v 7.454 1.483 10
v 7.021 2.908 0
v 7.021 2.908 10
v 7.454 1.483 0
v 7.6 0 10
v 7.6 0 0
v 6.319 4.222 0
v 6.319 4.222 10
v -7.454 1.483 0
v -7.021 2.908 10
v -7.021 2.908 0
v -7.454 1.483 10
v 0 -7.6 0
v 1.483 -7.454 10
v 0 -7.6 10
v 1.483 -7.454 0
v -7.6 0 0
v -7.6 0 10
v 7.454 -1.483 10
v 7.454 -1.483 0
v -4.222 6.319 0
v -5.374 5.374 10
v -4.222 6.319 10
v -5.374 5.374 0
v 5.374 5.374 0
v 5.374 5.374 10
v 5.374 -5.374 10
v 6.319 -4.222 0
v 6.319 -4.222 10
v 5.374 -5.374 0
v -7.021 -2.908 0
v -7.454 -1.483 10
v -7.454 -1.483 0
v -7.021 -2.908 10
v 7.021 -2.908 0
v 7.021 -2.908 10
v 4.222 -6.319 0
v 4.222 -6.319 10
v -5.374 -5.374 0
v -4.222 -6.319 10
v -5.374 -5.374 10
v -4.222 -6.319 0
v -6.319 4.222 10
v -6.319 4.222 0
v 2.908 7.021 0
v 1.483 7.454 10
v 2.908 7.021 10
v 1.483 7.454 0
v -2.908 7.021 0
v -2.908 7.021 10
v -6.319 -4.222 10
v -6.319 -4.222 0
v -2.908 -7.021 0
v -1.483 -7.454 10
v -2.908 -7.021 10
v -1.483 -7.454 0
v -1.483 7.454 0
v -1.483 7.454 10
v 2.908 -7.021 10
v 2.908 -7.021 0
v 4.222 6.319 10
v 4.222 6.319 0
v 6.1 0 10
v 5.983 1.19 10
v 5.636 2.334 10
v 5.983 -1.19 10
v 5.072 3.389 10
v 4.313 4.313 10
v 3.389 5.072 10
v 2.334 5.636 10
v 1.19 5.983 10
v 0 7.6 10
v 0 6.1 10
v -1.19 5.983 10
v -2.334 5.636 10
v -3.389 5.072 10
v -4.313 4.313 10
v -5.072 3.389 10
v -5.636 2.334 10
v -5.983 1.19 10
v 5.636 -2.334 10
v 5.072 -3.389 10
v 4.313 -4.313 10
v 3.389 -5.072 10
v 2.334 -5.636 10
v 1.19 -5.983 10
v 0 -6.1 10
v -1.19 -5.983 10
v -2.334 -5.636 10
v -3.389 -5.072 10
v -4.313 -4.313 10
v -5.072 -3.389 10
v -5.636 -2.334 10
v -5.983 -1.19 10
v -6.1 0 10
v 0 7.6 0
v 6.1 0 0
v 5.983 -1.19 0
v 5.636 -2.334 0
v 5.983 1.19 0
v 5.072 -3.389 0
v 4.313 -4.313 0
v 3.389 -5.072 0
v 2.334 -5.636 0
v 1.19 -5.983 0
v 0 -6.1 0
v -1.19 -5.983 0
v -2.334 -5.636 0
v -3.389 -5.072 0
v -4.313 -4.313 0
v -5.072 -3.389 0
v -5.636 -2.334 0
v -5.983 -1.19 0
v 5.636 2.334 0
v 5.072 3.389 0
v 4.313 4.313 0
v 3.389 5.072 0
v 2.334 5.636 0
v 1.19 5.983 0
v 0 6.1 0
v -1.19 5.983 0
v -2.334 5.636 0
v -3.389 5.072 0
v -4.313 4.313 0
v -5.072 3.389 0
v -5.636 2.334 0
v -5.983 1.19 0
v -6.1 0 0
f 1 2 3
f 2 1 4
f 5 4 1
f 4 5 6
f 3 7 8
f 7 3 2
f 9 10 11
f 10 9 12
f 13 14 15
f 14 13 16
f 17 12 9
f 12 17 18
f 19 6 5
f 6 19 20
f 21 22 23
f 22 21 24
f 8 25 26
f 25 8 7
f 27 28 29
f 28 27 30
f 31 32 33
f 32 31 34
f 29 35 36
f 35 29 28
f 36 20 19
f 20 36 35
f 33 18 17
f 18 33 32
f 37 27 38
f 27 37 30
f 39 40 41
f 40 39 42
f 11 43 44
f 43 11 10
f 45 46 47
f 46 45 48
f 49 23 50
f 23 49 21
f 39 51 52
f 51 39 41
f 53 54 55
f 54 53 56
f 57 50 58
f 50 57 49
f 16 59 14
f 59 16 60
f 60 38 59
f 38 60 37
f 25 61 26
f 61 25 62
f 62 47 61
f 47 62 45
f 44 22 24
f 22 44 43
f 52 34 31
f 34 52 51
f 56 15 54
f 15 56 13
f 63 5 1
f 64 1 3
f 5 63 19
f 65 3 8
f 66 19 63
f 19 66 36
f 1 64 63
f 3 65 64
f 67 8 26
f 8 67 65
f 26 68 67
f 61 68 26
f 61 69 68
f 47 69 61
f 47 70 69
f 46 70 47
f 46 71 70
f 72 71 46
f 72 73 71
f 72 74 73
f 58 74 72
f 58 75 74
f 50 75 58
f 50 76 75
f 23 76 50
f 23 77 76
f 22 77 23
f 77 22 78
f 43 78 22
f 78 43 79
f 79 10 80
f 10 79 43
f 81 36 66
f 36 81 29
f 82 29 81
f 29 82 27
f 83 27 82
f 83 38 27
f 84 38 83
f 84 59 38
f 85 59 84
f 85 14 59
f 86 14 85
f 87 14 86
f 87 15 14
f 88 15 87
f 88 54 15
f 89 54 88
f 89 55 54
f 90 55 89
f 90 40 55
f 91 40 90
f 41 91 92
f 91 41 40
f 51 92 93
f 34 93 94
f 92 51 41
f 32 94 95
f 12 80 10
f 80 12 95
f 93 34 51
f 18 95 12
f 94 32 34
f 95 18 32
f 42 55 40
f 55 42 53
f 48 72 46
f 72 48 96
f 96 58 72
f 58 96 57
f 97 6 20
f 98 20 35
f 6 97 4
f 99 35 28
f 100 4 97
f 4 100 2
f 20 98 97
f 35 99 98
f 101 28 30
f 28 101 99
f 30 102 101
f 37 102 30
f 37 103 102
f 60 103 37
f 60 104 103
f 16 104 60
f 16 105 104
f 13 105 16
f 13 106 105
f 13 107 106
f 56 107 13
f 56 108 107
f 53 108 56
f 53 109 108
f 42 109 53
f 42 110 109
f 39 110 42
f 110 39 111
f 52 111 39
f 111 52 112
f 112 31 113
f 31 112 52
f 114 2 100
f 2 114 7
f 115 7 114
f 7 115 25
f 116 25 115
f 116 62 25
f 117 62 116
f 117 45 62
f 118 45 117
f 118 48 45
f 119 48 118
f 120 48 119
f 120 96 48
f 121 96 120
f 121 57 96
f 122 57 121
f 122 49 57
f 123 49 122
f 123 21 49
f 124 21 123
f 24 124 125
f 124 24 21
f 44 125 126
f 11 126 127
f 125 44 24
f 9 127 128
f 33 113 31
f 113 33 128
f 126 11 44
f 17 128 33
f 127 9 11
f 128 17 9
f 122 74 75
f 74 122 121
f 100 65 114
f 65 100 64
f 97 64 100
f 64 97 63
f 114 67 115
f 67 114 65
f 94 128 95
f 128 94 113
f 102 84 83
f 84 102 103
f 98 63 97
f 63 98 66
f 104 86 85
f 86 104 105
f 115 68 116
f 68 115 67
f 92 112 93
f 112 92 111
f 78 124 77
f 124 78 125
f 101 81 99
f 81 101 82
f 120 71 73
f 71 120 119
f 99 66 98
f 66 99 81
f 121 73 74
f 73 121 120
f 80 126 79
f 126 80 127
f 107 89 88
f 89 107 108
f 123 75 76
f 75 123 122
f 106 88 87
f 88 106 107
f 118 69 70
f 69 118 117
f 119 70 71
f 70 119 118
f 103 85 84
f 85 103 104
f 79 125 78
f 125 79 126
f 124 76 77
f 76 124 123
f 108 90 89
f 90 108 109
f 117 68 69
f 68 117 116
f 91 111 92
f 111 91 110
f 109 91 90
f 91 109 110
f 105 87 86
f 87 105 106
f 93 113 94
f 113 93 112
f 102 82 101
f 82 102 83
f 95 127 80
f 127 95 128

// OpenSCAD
$fn = 32;

// ----------------------------------------------------------------------
// Spacer sleeve: 15.2 / 12.2 x 10 mm
// ----------------------------------------------------------------------

// --- parameters (mm) ---
sleeve_od = 15.2;         // outside diameter
sleeve_id = 12.2;         // shaft bore
sleeve_l = 10;            // sleeve length

module sleeve() {
  cylinder(h = sleeve_l, d = sleeve_od);
}

difference() {
  sleeve();
  translate([0, 0, -1]) cylinder(h = sleeve_l + 2, d = sleeve_id);
}
